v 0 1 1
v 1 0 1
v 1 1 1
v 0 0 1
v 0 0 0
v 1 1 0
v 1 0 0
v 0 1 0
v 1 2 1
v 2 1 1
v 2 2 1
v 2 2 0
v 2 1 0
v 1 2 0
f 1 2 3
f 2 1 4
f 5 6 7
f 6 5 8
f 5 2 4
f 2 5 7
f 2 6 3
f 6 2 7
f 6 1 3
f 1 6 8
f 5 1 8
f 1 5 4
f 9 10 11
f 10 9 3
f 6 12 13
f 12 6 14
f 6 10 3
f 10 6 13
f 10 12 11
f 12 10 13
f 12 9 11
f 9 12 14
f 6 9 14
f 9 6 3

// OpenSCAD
polyhedron(
  points=[
    [0, 0, 0],
    [1, 0, 0],
    [0, 1, 0],
    [1, 1, 0],
    [0, 0, 1],
    [1, 0, 1],
    [0, 1, 1],
    [1, 1, 1],

    [1, 1, 0],
    [2, 1, 0],
    [1, 2, 0],
    [2, 2, 0],
    [1, 1, 1],
    [2, 1, 1],
    [1, 2, 1],
    [2, 2, 1],
  ],
  faces=[
    [6,7,5,4],
    [0,1,3,2],
    [4,5,1,0],
    [5,7,3,1],
    [7,6,2,3],
    [6,4,0,2],
    [14,15,13,7],
    [3,9,11,10],
    [7,13,9,3],
    [13,15,11,9],
    [15,14,10,11],
    [14,7,3,10],
  ]);
